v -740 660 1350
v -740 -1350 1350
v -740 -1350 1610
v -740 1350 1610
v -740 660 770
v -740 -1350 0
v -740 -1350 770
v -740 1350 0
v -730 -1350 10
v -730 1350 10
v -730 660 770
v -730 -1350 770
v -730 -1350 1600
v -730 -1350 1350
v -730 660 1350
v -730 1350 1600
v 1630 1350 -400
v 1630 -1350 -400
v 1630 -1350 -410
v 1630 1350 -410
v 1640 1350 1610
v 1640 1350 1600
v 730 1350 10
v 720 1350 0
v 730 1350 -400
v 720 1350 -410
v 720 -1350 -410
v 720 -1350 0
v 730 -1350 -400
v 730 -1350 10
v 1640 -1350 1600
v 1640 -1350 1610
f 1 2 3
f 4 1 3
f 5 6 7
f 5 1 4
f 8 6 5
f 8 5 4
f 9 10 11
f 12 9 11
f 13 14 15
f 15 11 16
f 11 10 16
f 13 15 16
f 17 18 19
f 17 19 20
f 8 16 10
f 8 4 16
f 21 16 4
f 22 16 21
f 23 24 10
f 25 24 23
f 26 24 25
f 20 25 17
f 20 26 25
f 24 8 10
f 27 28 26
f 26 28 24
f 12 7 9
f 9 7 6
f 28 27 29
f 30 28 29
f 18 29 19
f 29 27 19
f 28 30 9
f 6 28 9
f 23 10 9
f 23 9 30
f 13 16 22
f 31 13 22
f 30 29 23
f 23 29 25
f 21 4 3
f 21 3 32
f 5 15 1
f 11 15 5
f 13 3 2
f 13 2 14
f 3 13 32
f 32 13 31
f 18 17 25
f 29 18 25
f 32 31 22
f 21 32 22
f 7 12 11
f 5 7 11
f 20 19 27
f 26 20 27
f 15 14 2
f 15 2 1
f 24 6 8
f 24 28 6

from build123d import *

# Parameters (mm, degrees)
SKETCH1_W           = 1460
SKETCH1_H           = 2700
BOSS_EXTRUDE1_DEPTH = 10
SKETCH2_W           = 410
SKETCH2_H           = 2700
BOSS_EXTRUDE2_DEPTH = 10
SKETCH3_W           = 910
SKETCH3_H           = 2700
BOSS_EXTRUDE3_DEPTH = 10
SKETCH4_W           = 1600
SKETCH4_H           = 2700
BOSS_EXTRUDE4_DEPTH = 10
SKETCH5_W           = 2380
SKETCH5_H           = 2700
BOSS_EXTRUDE5_DEPTH = 10
CUT_EXTRUDE1_REACH  = 3169.254
SKETCH6_W           = 580
SKETCH6_H           = 2010


with BuildPart() as part:
    # Sketch1 → Boss-Extrude1 (new body)
    with BuildSketch(Plane.XY):
        Rectangle(SKETCH1_W, SKETCH1_H)
    extrude(amount=BOSS_EXTRUDE1_DEPTH)

    # Sketch2 → Boss-Extrude2 (add)
    with BuildSketch(Plane(origin=(730, 0, 0), x_dir=(0, 0, -1), z_dir=(1, 0, 0))):
        with Locations((195, 0)):
            Rectangle(SKETCH2_W, SKETCH2_H)
    extrude(amount=-BOSS_EXTRUDE2_DEPTH)

    # Sketch3 → Boss-Extrude3 (add)
    with BuildSketch(Plane(origin=(0, 0, -400), x_dir=(-1, 0, 0), z_dir=(0, 0, -1))):
        with Locations((-1175, 0)):
            Rectangle(SKETCH3_W, SKETCH3_H)
    extrude(amount=BOSS_EXTRUDE3_DEPTH)

    # Sketch4 → Boss-Extrude4 (add)
    with BuildSketch(Plane.ZY.offset(730)):
        with Locations((800, 0)):
            Rectangle(SKETCH4_W, SKETCH4_H)
    extrude(amount=BOSS_EXTRUDE4_DEPTH)

    # Sketch5 → Boss-Extrude5 (add)
    with BuildSketch(Plane.XY.offset(1600)):
        with Locations((450, 0)):
            Rectangle(SKETCH5_W, SKETCH5_H)
    extrude(amount=BOSS_EXTRUDE5_DEPTH)

    # Sketch6 → Cut-Extrude1 (cut, up to next)
    with BuildSketch(Plane(origin=(-730, 0, 0), x_dir=(0, 0, -1), z_dir=(1, 0, 0)), mode=Mode.PRIVATE) as cut_extrude1_sk1:
        with Locations((-1060, -345)):
            Rectangle(SKETCH6_W, SKETCH6_H)
    cut_extrude1_tool1 = extrude(cut_extrude1_sk1.sketch, amount=-CUT_EXTRUDE1_REACH, mode=Mode.PRIVATE) & part.part
    add(cut_extrude1_tool1.solids().sort_by_distance((-730, -345, 1060))[0], mode=Mode.SUBTRACT)


solid = part.part
